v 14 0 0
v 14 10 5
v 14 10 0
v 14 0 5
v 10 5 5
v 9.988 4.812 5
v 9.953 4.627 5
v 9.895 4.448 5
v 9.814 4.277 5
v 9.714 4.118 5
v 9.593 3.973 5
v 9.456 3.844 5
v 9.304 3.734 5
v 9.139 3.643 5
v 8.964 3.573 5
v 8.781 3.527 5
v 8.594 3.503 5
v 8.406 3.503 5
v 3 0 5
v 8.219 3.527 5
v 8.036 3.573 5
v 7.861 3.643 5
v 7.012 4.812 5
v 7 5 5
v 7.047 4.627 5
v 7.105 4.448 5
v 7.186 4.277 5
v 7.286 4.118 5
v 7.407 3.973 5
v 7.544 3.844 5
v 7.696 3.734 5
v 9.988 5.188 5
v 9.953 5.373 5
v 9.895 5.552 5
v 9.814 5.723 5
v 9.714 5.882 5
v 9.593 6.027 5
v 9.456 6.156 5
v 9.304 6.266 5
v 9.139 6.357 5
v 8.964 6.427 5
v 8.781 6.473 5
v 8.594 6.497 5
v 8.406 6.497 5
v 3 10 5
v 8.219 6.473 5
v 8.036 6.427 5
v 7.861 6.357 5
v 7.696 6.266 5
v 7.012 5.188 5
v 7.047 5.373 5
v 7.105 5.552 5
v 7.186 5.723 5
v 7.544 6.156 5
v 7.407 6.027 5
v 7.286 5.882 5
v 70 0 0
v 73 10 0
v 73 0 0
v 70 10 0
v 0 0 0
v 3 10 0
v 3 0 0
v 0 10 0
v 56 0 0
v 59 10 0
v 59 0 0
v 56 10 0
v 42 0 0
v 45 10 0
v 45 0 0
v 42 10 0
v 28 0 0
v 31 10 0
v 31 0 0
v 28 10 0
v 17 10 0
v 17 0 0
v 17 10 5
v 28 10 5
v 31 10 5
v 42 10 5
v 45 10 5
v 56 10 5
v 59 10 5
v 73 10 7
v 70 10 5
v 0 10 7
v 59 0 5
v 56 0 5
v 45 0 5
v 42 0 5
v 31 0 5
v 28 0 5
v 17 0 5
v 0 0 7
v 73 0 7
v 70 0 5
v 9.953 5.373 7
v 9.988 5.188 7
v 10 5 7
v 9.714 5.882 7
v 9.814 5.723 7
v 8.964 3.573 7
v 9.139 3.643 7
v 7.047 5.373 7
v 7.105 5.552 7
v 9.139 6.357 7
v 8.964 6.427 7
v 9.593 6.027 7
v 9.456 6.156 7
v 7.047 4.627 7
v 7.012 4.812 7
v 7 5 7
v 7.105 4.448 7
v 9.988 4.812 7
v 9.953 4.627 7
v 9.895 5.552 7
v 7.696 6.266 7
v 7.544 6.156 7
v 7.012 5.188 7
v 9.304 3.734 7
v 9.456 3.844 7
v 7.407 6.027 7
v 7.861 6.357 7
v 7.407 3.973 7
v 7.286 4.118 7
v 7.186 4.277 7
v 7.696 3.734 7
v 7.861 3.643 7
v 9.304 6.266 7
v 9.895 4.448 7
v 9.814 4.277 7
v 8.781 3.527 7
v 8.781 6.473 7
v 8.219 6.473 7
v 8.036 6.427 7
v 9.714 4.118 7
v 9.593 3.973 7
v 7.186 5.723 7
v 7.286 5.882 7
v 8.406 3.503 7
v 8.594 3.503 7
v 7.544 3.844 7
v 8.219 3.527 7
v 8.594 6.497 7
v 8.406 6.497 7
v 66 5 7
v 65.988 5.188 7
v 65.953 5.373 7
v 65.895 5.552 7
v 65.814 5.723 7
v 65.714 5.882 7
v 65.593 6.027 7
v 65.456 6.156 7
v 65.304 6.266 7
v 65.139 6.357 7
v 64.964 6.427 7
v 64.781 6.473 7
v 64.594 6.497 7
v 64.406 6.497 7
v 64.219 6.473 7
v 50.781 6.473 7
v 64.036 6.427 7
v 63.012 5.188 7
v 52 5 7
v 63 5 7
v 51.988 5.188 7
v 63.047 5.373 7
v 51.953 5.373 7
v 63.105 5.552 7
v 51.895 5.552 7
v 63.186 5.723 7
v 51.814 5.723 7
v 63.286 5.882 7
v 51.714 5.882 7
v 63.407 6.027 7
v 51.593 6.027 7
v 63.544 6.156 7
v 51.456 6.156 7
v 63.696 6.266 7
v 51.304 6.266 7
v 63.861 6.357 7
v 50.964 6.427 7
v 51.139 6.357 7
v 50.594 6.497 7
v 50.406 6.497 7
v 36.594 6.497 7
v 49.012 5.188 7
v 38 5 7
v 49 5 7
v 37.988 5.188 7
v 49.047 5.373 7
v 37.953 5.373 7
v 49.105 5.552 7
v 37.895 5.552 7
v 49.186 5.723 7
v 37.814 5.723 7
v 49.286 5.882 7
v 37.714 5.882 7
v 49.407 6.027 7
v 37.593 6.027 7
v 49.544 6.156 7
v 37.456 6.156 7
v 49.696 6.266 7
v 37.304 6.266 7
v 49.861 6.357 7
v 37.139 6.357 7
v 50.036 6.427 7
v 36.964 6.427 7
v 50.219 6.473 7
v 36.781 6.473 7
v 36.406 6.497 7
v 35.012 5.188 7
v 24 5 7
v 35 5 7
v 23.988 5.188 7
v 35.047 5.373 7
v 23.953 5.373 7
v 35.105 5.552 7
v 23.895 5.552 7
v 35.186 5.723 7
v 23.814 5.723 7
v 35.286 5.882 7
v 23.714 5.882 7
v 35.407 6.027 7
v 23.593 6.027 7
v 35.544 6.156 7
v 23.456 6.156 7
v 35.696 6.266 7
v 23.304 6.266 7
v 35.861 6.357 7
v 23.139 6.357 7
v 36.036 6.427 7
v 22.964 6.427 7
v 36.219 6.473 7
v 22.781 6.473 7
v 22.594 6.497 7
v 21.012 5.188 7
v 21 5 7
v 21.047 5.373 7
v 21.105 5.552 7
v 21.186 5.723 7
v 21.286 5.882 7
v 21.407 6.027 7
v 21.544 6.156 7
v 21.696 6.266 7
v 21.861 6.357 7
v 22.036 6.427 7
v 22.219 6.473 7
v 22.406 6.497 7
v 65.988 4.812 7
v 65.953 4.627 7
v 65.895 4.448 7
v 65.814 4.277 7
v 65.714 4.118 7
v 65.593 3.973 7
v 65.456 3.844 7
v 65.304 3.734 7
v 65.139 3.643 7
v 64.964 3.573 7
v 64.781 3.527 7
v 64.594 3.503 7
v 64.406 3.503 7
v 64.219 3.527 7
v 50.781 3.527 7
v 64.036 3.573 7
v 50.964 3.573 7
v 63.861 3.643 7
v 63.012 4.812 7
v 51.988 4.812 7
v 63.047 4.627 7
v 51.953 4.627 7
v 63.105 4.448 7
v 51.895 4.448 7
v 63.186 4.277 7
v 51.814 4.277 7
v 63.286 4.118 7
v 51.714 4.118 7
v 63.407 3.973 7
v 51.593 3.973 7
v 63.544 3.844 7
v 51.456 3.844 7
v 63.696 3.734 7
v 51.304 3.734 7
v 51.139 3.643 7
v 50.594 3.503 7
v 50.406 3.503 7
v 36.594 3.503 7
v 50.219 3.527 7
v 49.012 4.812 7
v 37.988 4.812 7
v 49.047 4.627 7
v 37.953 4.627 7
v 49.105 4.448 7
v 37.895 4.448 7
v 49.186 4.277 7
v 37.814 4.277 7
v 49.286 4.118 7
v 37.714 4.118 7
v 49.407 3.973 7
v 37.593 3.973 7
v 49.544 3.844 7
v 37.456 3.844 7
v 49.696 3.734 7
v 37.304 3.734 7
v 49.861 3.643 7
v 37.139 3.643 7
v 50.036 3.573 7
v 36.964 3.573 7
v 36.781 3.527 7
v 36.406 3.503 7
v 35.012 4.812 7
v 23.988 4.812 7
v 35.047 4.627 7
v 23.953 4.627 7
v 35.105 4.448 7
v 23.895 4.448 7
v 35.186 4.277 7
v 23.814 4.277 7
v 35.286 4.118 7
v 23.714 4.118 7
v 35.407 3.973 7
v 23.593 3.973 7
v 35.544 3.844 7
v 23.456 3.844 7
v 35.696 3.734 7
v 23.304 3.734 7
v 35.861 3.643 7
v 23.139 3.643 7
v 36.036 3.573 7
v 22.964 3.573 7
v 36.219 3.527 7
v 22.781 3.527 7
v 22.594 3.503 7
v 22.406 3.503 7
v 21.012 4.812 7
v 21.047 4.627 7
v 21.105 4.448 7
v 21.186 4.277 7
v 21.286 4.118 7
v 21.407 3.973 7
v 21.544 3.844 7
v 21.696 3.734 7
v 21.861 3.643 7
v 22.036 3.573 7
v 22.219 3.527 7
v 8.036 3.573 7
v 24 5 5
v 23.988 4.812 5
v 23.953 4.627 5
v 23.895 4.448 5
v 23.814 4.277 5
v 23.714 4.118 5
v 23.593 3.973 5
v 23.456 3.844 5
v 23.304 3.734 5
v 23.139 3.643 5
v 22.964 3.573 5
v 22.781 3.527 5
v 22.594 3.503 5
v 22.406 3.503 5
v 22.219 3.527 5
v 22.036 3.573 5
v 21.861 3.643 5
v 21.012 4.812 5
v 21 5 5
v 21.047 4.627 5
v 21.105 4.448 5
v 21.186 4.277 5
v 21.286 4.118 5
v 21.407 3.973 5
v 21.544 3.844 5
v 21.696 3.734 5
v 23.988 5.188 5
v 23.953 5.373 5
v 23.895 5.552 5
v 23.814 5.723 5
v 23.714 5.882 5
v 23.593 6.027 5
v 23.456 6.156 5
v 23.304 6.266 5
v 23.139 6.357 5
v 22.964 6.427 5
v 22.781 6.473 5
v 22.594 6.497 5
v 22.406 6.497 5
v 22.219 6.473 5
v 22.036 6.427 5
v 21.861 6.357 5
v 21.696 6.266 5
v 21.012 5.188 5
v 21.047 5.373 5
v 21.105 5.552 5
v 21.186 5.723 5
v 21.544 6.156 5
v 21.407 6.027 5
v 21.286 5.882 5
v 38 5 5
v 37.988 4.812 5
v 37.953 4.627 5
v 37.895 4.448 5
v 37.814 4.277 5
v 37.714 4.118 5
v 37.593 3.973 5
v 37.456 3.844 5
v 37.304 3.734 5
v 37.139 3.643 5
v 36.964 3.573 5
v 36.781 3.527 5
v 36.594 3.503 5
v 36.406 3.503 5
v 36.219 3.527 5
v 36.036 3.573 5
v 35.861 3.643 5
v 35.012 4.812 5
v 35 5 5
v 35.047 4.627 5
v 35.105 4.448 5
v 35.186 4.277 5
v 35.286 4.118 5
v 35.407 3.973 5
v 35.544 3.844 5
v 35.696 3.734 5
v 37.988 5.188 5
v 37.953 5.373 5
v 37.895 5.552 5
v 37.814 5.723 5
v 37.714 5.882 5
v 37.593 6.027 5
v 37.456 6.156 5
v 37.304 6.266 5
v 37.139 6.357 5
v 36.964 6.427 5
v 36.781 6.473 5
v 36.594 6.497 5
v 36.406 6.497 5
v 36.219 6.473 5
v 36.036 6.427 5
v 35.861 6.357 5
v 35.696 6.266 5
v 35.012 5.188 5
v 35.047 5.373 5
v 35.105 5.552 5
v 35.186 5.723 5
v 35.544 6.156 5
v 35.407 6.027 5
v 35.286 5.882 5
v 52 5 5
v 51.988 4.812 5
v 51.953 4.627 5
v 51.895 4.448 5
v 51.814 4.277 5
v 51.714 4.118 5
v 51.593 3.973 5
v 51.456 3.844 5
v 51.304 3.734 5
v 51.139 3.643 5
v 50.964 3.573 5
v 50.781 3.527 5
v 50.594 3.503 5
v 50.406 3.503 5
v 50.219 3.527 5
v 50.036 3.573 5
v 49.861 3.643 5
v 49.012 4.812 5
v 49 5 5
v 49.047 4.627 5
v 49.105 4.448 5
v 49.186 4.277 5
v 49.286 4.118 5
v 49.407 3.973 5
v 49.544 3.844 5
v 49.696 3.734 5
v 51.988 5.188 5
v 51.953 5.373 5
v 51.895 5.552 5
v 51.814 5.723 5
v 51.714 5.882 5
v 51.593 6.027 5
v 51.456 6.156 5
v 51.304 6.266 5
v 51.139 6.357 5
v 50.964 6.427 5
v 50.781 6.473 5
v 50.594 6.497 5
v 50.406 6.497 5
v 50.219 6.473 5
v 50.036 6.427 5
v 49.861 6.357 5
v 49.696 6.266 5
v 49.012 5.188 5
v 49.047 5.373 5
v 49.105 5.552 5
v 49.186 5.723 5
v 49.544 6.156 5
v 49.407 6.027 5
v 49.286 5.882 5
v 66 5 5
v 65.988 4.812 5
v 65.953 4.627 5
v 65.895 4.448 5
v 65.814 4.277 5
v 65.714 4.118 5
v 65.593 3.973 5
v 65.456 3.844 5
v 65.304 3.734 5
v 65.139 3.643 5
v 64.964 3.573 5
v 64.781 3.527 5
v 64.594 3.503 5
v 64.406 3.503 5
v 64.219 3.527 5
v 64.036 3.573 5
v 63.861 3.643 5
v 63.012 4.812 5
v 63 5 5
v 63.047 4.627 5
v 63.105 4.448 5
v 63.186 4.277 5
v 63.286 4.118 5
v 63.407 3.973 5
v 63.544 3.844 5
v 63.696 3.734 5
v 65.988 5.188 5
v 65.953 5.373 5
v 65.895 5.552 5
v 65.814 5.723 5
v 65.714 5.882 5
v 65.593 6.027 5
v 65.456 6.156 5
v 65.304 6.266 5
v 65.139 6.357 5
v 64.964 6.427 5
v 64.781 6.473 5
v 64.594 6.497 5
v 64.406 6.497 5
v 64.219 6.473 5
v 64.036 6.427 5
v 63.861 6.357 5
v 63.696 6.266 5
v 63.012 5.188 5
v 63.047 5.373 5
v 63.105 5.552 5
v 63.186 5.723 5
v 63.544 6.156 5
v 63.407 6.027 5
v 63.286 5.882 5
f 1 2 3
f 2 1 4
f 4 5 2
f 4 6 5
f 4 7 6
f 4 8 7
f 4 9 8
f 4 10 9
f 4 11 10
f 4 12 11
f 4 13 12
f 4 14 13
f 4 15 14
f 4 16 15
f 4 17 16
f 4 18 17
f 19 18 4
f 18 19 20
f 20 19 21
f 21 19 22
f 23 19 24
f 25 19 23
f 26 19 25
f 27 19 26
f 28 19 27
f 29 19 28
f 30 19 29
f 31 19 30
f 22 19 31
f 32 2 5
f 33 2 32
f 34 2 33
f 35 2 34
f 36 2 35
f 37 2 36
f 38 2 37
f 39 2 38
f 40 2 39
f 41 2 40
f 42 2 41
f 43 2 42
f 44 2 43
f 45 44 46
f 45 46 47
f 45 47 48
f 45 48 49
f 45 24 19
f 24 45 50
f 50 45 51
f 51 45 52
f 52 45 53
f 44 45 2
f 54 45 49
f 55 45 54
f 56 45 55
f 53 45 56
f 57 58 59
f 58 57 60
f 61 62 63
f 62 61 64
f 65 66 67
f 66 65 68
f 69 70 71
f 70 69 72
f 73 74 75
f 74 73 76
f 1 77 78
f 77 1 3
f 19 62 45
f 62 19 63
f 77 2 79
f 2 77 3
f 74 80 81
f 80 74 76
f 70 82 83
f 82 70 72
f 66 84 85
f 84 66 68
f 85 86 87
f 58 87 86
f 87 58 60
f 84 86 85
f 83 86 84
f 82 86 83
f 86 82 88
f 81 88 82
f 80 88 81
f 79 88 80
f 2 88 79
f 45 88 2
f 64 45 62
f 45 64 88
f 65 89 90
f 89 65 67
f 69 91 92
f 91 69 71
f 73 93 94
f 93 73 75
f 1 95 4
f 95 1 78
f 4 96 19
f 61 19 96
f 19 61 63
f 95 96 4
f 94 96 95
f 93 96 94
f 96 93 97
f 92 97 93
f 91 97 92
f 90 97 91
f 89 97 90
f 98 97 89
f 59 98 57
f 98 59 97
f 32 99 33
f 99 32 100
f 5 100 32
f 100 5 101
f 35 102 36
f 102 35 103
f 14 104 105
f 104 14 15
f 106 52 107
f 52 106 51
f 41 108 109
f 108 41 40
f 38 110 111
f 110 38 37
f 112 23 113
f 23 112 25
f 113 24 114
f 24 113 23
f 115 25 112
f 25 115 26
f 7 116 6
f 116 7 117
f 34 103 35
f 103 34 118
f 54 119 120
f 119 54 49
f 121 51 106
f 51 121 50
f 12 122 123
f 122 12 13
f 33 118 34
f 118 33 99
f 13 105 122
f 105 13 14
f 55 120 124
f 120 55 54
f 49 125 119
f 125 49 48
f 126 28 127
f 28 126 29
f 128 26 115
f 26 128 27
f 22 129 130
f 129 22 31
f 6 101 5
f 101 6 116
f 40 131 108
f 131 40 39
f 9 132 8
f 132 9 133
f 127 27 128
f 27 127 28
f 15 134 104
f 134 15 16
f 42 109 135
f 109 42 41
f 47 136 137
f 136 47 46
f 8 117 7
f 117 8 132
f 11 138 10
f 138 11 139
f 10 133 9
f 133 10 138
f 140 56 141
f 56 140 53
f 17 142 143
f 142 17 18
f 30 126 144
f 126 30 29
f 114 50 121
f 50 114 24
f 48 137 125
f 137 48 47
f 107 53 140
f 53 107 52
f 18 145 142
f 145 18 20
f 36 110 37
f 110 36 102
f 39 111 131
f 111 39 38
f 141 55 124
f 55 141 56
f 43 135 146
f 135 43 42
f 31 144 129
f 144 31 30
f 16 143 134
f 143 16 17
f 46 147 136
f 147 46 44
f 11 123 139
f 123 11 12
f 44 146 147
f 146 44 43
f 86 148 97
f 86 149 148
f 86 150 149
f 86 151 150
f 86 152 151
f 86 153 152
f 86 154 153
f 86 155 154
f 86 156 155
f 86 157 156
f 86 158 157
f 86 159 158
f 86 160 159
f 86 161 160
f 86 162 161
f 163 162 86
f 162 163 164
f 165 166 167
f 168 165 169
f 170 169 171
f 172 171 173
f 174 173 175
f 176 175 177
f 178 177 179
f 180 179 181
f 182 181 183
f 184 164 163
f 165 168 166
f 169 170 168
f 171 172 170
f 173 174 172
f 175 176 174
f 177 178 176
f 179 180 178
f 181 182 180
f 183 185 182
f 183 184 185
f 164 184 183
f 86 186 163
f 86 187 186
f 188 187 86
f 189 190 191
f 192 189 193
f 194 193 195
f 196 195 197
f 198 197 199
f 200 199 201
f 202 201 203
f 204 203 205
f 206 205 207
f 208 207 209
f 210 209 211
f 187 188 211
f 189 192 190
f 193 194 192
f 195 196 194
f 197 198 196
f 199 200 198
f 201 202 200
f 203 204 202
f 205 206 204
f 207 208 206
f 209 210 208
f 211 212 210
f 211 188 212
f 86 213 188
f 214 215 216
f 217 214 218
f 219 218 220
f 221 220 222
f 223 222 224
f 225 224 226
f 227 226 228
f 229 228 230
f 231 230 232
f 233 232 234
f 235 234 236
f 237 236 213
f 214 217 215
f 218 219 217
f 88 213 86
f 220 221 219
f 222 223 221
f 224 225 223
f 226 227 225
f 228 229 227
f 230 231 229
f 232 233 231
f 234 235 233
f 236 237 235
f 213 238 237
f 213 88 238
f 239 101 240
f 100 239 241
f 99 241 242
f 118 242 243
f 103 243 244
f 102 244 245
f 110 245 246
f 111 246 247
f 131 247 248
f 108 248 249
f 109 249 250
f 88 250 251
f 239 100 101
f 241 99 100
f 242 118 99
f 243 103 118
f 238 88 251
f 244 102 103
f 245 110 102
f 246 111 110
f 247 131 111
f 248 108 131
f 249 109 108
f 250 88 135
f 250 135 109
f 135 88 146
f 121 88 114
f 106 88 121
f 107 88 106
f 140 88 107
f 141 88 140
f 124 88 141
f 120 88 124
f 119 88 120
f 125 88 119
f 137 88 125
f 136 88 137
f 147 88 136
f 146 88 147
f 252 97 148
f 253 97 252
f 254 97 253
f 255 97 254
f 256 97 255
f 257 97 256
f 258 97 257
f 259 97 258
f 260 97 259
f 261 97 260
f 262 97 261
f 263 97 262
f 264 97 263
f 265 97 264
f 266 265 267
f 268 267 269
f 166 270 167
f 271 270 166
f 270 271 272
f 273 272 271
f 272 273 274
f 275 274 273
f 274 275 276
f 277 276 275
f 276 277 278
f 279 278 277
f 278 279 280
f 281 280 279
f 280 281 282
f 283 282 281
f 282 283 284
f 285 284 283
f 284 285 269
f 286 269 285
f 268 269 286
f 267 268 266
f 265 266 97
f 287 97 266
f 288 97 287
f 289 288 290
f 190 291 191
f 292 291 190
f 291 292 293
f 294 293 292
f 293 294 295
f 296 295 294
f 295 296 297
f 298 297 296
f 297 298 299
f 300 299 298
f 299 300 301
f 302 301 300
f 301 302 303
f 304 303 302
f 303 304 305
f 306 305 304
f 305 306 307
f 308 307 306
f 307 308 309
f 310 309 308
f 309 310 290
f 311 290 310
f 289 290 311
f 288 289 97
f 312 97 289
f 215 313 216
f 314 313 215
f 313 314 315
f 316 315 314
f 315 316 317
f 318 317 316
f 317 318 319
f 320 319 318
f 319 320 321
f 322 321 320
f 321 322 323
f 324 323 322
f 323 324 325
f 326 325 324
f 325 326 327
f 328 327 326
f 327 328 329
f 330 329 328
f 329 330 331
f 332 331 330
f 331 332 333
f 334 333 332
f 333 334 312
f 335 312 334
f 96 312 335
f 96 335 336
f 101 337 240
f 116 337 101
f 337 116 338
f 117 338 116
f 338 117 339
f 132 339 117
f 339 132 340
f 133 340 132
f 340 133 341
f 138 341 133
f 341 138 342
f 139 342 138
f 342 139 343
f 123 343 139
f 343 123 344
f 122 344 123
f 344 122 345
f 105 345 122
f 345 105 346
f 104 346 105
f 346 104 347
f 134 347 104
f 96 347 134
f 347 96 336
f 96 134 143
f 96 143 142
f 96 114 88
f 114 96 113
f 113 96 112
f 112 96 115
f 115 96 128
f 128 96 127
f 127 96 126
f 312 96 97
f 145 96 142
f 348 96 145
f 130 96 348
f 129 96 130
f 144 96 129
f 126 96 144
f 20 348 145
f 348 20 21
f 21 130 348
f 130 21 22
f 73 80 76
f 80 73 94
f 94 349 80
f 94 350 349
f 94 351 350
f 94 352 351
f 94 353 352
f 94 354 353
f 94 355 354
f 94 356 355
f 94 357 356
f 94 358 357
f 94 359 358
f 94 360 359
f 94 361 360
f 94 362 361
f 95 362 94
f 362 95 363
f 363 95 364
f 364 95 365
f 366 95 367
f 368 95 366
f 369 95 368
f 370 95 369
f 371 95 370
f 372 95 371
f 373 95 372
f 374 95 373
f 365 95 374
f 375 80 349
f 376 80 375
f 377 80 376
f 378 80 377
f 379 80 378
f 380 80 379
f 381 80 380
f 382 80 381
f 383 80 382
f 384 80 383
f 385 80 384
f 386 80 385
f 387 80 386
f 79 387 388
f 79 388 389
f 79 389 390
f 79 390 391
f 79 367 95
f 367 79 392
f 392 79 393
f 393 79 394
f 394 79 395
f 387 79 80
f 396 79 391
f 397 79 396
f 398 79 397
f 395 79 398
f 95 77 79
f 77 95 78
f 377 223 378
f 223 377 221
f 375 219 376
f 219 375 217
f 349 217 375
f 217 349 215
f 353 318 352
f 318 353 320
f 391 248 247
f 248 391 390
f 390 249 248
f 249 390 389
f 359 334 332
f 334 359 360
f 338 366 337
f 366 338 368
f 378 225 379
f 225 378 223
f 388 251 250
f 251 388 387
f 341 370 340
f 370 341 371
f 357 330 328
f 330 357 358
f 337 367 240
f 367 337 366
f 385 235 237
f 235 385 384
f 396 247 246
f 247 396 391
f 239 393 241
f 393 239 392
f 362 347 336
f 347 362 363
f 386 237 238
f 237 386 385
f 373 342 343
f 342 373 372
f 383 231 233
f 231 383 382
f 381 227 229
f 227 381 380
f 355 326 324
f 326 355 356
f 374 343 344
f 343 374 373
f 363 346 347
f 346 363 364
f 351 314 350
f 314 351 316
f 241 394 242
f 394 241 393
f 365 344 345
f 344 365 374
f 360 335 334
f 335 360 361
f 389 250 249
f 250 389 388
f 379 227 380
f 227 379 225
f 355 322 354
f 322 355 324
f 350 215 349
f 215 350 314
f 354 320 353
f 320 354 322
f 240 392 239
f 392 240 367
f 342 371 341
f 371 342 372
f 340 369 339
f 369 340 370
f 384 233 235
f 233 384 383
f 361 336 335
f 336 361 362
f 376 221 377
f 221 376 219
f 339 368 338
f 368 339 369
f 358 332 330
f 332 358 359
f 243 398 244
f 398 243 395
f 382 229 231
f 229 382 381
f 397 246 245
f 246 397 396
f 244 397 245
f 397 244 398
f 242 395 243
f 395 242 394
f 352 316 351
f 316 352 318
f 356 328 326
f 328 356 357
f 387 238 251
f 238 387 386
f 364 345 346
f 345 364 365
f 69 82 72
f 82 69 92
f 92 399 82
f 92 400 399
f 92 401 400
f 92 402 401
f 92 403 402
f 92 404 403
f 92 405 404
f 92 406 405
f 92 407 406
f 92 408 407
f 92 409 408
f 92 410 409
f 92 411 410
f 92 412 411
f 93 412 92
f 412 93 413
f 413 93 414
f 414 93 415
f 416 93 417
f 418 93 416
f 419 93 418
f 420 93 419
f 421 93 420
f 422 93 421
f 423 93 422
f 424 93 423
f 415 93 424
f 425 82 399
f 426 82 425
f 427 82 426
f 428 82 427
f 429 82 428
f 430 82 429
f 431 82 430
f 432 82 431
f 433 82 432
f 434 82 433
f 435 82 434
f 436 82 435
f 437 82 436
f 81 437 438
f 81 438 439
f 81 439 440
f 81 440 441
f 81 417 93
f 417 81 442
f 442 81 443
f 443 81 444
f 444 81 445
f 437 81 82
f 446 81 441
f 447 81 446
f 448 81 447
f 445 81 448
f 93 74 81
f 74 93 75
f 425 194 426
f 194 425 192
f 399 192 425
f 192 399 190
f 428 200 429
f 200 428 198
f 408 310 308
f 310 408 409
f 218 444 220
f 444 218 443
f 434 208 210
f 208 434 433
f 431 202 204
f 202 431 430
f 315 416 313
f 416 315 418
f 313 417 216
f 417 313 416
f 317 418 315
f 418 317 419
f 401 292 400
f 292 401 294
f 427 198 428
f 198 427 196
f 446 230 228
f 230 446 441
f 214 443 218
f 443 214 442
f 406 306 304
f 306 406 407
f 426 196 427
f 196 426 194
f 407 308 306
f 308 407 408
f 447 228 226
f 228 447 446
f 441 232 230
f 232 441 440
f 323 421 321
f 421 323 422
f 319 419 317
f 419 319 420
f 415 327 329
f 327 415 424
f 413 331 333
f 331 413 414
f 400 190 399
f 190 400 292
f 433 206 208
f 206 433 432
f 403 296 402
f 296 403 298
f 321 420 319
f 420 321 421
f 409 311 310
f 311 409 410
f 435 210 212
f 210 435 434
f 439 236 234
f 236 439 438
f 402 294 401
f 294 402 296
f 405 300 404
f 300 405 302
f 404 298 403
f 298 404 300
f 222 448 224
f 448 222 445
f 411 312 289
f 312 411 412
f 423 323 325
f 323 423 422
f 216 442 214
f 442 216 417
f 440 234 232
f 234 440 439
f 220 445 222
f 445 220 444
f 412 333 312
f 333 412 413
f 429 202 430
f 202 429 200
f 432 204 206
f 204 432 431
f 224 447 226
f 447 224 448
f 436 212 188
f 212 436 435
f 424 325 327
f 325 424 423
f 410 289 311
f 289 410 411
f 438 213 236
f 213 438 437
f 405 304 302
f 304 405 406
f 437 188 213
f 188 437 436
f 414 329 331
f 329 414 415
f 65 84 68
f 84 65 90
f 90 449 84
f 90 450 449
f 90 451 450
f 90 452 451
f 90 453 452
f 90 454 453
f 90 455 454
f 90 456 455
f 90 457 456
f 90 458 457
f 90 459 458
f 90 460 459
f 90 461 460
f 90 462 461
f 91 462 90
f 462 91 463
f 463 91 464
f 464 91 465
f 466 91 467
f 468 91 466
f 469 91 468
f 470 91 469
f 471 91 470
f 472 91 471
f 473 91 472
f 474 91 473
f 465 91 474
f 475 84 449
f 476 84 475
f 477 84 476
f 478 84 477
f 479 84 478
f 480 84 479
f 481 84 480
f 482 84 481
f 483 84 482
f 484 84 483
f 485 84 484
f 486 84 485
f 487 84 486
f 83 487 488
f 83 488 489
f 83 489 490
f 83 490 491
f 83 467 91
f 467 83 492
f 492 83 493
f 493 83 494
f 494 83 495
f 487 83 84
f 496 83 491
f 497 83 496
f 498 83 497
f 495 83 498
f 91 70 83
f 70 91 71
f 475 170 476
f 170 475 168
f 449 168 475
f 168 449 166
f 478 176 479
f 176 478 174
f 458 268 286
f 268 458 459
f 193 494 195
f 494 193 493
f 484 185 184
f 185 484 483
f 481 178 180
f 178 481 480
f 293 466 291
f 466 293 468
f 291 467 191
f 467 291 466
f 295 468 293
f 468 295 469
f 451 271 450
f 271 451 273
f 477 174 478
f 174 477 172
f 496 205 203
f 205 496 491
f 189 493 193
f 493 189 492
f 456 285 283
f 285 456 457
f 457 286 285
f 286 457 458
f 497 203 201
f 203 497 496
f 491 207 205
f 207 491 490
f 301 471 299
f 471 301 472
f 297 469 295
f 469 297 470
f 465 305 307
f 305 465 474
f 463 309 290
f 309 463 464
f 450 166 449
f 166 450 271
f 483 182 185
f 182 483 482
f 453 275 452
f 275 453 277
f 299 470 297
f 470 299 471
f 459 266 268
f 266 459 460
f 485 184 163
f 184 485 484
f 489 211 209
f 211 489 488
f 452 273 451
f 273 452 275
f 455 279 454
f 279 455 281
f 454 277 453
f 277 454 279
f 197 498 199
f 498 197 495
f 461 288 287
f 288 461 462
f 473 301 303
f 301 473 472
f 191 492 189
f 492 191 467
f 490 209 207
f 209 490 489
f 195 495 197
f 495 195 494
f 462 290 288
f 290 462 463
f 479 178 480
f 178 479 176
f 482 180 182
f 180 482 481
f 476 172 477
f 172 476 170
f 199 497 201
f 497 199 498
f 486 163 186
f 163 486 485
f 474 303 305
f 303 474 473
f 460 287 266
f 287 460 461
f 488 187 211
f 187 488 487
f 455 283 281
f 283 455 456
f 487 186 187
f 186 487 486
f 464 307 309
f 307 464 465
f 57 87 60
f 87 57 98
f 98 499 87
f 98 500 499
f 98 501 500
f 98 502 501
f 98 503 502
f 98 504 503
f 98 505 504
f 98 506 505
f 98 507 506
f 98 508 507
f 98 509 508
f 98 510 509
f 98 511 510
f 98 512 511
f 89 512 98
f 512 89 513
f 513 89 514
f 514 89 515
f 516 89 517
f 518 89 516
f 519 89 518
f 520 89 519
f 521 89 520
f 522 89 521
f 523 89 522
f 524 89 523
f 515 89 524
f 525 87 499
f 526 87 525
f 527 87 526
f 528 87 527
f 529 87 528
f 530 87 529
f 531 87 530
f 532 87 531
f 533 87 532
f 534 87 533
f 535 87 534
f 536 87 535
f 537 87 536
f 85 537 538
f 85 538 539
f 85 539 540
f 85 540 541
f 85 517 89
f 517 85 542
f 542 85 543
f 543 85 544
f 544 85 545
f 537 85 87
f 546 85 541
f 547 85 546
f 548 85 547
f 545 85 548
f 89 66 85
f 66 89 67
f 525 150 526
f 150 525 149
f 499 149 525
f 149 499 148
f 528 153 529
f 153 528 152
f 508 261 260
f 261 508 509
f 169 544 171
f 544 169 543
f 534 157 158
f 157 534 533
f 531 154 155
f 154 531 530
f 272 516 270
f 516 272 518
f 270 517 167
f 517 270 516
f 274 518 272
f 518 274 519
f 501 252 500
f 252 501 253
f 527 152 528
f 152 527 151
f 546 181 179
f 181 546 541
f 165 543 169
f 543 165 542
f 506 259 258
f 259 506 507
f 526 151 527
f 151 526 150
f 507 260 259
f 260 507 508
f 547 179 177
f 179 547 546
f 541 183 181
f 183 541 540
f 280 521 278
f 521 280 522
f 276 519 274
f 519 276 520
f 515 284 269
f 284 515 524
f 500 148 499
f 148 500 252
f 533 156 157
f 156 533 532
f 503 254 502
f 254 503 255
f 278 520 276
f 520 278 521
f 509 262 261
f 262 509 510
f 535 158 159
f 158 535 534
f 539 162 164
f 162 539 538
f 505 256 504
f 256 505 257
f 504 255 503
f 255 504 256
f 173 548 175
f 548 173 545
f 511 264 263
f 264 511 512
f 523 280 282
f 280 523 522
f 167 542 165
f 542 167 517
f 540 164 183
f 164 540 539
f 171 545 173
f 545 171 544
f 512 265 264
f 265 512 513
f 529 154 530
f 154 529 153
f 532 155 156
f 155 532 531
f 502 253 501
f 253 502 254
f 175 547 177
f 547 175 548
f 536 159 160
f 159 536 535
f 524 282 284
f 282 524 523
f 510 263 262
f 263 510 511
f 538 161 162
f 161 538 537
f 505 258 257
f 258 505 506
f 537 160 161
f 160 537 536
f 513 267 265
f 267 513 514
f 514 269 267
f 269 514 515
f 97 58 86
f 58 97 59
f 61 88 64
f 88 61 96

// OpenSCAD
//Body messurements
depth = 10;
height = 7;

//Cutout messurements
cutout_length = 11;
cutout_height = 5;

//Divider messurements
divider = 3;

//Screwhole size
hole_size = 3;

//Cylinder faces
faces = 50;

//How many sensors?
repeat = 5;

//Spacing distance for cylinder to make code shorter in length
space = divider+cutout_length;

//Calculates length of body and assigns value to variable length
length = ((divider+cutout_length)*repeat)+divider;

difference() {
    //Make body
    cube([repeat*cutout_length+(repeat+1)*divider,depth,height]);
    
    //Make cutouts and screw holes
    for (i = [1 : repeat]) {
        
        //Cutouts
        translate([(divider*i)+(cutout_length*(i-1)),0,0])
            cube([cutout_length,depth,cutout_height]);
            
        //Screw holes
        translate([space*i-cutout_length/2, depth/2, cutout_height])
            cylinder(h=height-cutout_height, d=hole_size, $fn=faces);
    }
}

//Make handles
handle_offset = 5;

/*
//Handle 1
translate([handle_offset*-1, 0, cutout_height])
    cube([handle_offset, depth, height-cutout_height]);

translate([handle_offset*-1, depth/2, cutout_height])
    cylinder(h=height-cutout_height, r=depth/2, $fn=faces);

//Handle 2
translate([length, 0, cutout_height])
    cube([handle_offset, depth, height-cutout_height]);

translate([length+handle_offset, depth/2, cutout_height])
    cylinder(h=height-cutout_height, r=depth/2, $fn=faces);
*/
